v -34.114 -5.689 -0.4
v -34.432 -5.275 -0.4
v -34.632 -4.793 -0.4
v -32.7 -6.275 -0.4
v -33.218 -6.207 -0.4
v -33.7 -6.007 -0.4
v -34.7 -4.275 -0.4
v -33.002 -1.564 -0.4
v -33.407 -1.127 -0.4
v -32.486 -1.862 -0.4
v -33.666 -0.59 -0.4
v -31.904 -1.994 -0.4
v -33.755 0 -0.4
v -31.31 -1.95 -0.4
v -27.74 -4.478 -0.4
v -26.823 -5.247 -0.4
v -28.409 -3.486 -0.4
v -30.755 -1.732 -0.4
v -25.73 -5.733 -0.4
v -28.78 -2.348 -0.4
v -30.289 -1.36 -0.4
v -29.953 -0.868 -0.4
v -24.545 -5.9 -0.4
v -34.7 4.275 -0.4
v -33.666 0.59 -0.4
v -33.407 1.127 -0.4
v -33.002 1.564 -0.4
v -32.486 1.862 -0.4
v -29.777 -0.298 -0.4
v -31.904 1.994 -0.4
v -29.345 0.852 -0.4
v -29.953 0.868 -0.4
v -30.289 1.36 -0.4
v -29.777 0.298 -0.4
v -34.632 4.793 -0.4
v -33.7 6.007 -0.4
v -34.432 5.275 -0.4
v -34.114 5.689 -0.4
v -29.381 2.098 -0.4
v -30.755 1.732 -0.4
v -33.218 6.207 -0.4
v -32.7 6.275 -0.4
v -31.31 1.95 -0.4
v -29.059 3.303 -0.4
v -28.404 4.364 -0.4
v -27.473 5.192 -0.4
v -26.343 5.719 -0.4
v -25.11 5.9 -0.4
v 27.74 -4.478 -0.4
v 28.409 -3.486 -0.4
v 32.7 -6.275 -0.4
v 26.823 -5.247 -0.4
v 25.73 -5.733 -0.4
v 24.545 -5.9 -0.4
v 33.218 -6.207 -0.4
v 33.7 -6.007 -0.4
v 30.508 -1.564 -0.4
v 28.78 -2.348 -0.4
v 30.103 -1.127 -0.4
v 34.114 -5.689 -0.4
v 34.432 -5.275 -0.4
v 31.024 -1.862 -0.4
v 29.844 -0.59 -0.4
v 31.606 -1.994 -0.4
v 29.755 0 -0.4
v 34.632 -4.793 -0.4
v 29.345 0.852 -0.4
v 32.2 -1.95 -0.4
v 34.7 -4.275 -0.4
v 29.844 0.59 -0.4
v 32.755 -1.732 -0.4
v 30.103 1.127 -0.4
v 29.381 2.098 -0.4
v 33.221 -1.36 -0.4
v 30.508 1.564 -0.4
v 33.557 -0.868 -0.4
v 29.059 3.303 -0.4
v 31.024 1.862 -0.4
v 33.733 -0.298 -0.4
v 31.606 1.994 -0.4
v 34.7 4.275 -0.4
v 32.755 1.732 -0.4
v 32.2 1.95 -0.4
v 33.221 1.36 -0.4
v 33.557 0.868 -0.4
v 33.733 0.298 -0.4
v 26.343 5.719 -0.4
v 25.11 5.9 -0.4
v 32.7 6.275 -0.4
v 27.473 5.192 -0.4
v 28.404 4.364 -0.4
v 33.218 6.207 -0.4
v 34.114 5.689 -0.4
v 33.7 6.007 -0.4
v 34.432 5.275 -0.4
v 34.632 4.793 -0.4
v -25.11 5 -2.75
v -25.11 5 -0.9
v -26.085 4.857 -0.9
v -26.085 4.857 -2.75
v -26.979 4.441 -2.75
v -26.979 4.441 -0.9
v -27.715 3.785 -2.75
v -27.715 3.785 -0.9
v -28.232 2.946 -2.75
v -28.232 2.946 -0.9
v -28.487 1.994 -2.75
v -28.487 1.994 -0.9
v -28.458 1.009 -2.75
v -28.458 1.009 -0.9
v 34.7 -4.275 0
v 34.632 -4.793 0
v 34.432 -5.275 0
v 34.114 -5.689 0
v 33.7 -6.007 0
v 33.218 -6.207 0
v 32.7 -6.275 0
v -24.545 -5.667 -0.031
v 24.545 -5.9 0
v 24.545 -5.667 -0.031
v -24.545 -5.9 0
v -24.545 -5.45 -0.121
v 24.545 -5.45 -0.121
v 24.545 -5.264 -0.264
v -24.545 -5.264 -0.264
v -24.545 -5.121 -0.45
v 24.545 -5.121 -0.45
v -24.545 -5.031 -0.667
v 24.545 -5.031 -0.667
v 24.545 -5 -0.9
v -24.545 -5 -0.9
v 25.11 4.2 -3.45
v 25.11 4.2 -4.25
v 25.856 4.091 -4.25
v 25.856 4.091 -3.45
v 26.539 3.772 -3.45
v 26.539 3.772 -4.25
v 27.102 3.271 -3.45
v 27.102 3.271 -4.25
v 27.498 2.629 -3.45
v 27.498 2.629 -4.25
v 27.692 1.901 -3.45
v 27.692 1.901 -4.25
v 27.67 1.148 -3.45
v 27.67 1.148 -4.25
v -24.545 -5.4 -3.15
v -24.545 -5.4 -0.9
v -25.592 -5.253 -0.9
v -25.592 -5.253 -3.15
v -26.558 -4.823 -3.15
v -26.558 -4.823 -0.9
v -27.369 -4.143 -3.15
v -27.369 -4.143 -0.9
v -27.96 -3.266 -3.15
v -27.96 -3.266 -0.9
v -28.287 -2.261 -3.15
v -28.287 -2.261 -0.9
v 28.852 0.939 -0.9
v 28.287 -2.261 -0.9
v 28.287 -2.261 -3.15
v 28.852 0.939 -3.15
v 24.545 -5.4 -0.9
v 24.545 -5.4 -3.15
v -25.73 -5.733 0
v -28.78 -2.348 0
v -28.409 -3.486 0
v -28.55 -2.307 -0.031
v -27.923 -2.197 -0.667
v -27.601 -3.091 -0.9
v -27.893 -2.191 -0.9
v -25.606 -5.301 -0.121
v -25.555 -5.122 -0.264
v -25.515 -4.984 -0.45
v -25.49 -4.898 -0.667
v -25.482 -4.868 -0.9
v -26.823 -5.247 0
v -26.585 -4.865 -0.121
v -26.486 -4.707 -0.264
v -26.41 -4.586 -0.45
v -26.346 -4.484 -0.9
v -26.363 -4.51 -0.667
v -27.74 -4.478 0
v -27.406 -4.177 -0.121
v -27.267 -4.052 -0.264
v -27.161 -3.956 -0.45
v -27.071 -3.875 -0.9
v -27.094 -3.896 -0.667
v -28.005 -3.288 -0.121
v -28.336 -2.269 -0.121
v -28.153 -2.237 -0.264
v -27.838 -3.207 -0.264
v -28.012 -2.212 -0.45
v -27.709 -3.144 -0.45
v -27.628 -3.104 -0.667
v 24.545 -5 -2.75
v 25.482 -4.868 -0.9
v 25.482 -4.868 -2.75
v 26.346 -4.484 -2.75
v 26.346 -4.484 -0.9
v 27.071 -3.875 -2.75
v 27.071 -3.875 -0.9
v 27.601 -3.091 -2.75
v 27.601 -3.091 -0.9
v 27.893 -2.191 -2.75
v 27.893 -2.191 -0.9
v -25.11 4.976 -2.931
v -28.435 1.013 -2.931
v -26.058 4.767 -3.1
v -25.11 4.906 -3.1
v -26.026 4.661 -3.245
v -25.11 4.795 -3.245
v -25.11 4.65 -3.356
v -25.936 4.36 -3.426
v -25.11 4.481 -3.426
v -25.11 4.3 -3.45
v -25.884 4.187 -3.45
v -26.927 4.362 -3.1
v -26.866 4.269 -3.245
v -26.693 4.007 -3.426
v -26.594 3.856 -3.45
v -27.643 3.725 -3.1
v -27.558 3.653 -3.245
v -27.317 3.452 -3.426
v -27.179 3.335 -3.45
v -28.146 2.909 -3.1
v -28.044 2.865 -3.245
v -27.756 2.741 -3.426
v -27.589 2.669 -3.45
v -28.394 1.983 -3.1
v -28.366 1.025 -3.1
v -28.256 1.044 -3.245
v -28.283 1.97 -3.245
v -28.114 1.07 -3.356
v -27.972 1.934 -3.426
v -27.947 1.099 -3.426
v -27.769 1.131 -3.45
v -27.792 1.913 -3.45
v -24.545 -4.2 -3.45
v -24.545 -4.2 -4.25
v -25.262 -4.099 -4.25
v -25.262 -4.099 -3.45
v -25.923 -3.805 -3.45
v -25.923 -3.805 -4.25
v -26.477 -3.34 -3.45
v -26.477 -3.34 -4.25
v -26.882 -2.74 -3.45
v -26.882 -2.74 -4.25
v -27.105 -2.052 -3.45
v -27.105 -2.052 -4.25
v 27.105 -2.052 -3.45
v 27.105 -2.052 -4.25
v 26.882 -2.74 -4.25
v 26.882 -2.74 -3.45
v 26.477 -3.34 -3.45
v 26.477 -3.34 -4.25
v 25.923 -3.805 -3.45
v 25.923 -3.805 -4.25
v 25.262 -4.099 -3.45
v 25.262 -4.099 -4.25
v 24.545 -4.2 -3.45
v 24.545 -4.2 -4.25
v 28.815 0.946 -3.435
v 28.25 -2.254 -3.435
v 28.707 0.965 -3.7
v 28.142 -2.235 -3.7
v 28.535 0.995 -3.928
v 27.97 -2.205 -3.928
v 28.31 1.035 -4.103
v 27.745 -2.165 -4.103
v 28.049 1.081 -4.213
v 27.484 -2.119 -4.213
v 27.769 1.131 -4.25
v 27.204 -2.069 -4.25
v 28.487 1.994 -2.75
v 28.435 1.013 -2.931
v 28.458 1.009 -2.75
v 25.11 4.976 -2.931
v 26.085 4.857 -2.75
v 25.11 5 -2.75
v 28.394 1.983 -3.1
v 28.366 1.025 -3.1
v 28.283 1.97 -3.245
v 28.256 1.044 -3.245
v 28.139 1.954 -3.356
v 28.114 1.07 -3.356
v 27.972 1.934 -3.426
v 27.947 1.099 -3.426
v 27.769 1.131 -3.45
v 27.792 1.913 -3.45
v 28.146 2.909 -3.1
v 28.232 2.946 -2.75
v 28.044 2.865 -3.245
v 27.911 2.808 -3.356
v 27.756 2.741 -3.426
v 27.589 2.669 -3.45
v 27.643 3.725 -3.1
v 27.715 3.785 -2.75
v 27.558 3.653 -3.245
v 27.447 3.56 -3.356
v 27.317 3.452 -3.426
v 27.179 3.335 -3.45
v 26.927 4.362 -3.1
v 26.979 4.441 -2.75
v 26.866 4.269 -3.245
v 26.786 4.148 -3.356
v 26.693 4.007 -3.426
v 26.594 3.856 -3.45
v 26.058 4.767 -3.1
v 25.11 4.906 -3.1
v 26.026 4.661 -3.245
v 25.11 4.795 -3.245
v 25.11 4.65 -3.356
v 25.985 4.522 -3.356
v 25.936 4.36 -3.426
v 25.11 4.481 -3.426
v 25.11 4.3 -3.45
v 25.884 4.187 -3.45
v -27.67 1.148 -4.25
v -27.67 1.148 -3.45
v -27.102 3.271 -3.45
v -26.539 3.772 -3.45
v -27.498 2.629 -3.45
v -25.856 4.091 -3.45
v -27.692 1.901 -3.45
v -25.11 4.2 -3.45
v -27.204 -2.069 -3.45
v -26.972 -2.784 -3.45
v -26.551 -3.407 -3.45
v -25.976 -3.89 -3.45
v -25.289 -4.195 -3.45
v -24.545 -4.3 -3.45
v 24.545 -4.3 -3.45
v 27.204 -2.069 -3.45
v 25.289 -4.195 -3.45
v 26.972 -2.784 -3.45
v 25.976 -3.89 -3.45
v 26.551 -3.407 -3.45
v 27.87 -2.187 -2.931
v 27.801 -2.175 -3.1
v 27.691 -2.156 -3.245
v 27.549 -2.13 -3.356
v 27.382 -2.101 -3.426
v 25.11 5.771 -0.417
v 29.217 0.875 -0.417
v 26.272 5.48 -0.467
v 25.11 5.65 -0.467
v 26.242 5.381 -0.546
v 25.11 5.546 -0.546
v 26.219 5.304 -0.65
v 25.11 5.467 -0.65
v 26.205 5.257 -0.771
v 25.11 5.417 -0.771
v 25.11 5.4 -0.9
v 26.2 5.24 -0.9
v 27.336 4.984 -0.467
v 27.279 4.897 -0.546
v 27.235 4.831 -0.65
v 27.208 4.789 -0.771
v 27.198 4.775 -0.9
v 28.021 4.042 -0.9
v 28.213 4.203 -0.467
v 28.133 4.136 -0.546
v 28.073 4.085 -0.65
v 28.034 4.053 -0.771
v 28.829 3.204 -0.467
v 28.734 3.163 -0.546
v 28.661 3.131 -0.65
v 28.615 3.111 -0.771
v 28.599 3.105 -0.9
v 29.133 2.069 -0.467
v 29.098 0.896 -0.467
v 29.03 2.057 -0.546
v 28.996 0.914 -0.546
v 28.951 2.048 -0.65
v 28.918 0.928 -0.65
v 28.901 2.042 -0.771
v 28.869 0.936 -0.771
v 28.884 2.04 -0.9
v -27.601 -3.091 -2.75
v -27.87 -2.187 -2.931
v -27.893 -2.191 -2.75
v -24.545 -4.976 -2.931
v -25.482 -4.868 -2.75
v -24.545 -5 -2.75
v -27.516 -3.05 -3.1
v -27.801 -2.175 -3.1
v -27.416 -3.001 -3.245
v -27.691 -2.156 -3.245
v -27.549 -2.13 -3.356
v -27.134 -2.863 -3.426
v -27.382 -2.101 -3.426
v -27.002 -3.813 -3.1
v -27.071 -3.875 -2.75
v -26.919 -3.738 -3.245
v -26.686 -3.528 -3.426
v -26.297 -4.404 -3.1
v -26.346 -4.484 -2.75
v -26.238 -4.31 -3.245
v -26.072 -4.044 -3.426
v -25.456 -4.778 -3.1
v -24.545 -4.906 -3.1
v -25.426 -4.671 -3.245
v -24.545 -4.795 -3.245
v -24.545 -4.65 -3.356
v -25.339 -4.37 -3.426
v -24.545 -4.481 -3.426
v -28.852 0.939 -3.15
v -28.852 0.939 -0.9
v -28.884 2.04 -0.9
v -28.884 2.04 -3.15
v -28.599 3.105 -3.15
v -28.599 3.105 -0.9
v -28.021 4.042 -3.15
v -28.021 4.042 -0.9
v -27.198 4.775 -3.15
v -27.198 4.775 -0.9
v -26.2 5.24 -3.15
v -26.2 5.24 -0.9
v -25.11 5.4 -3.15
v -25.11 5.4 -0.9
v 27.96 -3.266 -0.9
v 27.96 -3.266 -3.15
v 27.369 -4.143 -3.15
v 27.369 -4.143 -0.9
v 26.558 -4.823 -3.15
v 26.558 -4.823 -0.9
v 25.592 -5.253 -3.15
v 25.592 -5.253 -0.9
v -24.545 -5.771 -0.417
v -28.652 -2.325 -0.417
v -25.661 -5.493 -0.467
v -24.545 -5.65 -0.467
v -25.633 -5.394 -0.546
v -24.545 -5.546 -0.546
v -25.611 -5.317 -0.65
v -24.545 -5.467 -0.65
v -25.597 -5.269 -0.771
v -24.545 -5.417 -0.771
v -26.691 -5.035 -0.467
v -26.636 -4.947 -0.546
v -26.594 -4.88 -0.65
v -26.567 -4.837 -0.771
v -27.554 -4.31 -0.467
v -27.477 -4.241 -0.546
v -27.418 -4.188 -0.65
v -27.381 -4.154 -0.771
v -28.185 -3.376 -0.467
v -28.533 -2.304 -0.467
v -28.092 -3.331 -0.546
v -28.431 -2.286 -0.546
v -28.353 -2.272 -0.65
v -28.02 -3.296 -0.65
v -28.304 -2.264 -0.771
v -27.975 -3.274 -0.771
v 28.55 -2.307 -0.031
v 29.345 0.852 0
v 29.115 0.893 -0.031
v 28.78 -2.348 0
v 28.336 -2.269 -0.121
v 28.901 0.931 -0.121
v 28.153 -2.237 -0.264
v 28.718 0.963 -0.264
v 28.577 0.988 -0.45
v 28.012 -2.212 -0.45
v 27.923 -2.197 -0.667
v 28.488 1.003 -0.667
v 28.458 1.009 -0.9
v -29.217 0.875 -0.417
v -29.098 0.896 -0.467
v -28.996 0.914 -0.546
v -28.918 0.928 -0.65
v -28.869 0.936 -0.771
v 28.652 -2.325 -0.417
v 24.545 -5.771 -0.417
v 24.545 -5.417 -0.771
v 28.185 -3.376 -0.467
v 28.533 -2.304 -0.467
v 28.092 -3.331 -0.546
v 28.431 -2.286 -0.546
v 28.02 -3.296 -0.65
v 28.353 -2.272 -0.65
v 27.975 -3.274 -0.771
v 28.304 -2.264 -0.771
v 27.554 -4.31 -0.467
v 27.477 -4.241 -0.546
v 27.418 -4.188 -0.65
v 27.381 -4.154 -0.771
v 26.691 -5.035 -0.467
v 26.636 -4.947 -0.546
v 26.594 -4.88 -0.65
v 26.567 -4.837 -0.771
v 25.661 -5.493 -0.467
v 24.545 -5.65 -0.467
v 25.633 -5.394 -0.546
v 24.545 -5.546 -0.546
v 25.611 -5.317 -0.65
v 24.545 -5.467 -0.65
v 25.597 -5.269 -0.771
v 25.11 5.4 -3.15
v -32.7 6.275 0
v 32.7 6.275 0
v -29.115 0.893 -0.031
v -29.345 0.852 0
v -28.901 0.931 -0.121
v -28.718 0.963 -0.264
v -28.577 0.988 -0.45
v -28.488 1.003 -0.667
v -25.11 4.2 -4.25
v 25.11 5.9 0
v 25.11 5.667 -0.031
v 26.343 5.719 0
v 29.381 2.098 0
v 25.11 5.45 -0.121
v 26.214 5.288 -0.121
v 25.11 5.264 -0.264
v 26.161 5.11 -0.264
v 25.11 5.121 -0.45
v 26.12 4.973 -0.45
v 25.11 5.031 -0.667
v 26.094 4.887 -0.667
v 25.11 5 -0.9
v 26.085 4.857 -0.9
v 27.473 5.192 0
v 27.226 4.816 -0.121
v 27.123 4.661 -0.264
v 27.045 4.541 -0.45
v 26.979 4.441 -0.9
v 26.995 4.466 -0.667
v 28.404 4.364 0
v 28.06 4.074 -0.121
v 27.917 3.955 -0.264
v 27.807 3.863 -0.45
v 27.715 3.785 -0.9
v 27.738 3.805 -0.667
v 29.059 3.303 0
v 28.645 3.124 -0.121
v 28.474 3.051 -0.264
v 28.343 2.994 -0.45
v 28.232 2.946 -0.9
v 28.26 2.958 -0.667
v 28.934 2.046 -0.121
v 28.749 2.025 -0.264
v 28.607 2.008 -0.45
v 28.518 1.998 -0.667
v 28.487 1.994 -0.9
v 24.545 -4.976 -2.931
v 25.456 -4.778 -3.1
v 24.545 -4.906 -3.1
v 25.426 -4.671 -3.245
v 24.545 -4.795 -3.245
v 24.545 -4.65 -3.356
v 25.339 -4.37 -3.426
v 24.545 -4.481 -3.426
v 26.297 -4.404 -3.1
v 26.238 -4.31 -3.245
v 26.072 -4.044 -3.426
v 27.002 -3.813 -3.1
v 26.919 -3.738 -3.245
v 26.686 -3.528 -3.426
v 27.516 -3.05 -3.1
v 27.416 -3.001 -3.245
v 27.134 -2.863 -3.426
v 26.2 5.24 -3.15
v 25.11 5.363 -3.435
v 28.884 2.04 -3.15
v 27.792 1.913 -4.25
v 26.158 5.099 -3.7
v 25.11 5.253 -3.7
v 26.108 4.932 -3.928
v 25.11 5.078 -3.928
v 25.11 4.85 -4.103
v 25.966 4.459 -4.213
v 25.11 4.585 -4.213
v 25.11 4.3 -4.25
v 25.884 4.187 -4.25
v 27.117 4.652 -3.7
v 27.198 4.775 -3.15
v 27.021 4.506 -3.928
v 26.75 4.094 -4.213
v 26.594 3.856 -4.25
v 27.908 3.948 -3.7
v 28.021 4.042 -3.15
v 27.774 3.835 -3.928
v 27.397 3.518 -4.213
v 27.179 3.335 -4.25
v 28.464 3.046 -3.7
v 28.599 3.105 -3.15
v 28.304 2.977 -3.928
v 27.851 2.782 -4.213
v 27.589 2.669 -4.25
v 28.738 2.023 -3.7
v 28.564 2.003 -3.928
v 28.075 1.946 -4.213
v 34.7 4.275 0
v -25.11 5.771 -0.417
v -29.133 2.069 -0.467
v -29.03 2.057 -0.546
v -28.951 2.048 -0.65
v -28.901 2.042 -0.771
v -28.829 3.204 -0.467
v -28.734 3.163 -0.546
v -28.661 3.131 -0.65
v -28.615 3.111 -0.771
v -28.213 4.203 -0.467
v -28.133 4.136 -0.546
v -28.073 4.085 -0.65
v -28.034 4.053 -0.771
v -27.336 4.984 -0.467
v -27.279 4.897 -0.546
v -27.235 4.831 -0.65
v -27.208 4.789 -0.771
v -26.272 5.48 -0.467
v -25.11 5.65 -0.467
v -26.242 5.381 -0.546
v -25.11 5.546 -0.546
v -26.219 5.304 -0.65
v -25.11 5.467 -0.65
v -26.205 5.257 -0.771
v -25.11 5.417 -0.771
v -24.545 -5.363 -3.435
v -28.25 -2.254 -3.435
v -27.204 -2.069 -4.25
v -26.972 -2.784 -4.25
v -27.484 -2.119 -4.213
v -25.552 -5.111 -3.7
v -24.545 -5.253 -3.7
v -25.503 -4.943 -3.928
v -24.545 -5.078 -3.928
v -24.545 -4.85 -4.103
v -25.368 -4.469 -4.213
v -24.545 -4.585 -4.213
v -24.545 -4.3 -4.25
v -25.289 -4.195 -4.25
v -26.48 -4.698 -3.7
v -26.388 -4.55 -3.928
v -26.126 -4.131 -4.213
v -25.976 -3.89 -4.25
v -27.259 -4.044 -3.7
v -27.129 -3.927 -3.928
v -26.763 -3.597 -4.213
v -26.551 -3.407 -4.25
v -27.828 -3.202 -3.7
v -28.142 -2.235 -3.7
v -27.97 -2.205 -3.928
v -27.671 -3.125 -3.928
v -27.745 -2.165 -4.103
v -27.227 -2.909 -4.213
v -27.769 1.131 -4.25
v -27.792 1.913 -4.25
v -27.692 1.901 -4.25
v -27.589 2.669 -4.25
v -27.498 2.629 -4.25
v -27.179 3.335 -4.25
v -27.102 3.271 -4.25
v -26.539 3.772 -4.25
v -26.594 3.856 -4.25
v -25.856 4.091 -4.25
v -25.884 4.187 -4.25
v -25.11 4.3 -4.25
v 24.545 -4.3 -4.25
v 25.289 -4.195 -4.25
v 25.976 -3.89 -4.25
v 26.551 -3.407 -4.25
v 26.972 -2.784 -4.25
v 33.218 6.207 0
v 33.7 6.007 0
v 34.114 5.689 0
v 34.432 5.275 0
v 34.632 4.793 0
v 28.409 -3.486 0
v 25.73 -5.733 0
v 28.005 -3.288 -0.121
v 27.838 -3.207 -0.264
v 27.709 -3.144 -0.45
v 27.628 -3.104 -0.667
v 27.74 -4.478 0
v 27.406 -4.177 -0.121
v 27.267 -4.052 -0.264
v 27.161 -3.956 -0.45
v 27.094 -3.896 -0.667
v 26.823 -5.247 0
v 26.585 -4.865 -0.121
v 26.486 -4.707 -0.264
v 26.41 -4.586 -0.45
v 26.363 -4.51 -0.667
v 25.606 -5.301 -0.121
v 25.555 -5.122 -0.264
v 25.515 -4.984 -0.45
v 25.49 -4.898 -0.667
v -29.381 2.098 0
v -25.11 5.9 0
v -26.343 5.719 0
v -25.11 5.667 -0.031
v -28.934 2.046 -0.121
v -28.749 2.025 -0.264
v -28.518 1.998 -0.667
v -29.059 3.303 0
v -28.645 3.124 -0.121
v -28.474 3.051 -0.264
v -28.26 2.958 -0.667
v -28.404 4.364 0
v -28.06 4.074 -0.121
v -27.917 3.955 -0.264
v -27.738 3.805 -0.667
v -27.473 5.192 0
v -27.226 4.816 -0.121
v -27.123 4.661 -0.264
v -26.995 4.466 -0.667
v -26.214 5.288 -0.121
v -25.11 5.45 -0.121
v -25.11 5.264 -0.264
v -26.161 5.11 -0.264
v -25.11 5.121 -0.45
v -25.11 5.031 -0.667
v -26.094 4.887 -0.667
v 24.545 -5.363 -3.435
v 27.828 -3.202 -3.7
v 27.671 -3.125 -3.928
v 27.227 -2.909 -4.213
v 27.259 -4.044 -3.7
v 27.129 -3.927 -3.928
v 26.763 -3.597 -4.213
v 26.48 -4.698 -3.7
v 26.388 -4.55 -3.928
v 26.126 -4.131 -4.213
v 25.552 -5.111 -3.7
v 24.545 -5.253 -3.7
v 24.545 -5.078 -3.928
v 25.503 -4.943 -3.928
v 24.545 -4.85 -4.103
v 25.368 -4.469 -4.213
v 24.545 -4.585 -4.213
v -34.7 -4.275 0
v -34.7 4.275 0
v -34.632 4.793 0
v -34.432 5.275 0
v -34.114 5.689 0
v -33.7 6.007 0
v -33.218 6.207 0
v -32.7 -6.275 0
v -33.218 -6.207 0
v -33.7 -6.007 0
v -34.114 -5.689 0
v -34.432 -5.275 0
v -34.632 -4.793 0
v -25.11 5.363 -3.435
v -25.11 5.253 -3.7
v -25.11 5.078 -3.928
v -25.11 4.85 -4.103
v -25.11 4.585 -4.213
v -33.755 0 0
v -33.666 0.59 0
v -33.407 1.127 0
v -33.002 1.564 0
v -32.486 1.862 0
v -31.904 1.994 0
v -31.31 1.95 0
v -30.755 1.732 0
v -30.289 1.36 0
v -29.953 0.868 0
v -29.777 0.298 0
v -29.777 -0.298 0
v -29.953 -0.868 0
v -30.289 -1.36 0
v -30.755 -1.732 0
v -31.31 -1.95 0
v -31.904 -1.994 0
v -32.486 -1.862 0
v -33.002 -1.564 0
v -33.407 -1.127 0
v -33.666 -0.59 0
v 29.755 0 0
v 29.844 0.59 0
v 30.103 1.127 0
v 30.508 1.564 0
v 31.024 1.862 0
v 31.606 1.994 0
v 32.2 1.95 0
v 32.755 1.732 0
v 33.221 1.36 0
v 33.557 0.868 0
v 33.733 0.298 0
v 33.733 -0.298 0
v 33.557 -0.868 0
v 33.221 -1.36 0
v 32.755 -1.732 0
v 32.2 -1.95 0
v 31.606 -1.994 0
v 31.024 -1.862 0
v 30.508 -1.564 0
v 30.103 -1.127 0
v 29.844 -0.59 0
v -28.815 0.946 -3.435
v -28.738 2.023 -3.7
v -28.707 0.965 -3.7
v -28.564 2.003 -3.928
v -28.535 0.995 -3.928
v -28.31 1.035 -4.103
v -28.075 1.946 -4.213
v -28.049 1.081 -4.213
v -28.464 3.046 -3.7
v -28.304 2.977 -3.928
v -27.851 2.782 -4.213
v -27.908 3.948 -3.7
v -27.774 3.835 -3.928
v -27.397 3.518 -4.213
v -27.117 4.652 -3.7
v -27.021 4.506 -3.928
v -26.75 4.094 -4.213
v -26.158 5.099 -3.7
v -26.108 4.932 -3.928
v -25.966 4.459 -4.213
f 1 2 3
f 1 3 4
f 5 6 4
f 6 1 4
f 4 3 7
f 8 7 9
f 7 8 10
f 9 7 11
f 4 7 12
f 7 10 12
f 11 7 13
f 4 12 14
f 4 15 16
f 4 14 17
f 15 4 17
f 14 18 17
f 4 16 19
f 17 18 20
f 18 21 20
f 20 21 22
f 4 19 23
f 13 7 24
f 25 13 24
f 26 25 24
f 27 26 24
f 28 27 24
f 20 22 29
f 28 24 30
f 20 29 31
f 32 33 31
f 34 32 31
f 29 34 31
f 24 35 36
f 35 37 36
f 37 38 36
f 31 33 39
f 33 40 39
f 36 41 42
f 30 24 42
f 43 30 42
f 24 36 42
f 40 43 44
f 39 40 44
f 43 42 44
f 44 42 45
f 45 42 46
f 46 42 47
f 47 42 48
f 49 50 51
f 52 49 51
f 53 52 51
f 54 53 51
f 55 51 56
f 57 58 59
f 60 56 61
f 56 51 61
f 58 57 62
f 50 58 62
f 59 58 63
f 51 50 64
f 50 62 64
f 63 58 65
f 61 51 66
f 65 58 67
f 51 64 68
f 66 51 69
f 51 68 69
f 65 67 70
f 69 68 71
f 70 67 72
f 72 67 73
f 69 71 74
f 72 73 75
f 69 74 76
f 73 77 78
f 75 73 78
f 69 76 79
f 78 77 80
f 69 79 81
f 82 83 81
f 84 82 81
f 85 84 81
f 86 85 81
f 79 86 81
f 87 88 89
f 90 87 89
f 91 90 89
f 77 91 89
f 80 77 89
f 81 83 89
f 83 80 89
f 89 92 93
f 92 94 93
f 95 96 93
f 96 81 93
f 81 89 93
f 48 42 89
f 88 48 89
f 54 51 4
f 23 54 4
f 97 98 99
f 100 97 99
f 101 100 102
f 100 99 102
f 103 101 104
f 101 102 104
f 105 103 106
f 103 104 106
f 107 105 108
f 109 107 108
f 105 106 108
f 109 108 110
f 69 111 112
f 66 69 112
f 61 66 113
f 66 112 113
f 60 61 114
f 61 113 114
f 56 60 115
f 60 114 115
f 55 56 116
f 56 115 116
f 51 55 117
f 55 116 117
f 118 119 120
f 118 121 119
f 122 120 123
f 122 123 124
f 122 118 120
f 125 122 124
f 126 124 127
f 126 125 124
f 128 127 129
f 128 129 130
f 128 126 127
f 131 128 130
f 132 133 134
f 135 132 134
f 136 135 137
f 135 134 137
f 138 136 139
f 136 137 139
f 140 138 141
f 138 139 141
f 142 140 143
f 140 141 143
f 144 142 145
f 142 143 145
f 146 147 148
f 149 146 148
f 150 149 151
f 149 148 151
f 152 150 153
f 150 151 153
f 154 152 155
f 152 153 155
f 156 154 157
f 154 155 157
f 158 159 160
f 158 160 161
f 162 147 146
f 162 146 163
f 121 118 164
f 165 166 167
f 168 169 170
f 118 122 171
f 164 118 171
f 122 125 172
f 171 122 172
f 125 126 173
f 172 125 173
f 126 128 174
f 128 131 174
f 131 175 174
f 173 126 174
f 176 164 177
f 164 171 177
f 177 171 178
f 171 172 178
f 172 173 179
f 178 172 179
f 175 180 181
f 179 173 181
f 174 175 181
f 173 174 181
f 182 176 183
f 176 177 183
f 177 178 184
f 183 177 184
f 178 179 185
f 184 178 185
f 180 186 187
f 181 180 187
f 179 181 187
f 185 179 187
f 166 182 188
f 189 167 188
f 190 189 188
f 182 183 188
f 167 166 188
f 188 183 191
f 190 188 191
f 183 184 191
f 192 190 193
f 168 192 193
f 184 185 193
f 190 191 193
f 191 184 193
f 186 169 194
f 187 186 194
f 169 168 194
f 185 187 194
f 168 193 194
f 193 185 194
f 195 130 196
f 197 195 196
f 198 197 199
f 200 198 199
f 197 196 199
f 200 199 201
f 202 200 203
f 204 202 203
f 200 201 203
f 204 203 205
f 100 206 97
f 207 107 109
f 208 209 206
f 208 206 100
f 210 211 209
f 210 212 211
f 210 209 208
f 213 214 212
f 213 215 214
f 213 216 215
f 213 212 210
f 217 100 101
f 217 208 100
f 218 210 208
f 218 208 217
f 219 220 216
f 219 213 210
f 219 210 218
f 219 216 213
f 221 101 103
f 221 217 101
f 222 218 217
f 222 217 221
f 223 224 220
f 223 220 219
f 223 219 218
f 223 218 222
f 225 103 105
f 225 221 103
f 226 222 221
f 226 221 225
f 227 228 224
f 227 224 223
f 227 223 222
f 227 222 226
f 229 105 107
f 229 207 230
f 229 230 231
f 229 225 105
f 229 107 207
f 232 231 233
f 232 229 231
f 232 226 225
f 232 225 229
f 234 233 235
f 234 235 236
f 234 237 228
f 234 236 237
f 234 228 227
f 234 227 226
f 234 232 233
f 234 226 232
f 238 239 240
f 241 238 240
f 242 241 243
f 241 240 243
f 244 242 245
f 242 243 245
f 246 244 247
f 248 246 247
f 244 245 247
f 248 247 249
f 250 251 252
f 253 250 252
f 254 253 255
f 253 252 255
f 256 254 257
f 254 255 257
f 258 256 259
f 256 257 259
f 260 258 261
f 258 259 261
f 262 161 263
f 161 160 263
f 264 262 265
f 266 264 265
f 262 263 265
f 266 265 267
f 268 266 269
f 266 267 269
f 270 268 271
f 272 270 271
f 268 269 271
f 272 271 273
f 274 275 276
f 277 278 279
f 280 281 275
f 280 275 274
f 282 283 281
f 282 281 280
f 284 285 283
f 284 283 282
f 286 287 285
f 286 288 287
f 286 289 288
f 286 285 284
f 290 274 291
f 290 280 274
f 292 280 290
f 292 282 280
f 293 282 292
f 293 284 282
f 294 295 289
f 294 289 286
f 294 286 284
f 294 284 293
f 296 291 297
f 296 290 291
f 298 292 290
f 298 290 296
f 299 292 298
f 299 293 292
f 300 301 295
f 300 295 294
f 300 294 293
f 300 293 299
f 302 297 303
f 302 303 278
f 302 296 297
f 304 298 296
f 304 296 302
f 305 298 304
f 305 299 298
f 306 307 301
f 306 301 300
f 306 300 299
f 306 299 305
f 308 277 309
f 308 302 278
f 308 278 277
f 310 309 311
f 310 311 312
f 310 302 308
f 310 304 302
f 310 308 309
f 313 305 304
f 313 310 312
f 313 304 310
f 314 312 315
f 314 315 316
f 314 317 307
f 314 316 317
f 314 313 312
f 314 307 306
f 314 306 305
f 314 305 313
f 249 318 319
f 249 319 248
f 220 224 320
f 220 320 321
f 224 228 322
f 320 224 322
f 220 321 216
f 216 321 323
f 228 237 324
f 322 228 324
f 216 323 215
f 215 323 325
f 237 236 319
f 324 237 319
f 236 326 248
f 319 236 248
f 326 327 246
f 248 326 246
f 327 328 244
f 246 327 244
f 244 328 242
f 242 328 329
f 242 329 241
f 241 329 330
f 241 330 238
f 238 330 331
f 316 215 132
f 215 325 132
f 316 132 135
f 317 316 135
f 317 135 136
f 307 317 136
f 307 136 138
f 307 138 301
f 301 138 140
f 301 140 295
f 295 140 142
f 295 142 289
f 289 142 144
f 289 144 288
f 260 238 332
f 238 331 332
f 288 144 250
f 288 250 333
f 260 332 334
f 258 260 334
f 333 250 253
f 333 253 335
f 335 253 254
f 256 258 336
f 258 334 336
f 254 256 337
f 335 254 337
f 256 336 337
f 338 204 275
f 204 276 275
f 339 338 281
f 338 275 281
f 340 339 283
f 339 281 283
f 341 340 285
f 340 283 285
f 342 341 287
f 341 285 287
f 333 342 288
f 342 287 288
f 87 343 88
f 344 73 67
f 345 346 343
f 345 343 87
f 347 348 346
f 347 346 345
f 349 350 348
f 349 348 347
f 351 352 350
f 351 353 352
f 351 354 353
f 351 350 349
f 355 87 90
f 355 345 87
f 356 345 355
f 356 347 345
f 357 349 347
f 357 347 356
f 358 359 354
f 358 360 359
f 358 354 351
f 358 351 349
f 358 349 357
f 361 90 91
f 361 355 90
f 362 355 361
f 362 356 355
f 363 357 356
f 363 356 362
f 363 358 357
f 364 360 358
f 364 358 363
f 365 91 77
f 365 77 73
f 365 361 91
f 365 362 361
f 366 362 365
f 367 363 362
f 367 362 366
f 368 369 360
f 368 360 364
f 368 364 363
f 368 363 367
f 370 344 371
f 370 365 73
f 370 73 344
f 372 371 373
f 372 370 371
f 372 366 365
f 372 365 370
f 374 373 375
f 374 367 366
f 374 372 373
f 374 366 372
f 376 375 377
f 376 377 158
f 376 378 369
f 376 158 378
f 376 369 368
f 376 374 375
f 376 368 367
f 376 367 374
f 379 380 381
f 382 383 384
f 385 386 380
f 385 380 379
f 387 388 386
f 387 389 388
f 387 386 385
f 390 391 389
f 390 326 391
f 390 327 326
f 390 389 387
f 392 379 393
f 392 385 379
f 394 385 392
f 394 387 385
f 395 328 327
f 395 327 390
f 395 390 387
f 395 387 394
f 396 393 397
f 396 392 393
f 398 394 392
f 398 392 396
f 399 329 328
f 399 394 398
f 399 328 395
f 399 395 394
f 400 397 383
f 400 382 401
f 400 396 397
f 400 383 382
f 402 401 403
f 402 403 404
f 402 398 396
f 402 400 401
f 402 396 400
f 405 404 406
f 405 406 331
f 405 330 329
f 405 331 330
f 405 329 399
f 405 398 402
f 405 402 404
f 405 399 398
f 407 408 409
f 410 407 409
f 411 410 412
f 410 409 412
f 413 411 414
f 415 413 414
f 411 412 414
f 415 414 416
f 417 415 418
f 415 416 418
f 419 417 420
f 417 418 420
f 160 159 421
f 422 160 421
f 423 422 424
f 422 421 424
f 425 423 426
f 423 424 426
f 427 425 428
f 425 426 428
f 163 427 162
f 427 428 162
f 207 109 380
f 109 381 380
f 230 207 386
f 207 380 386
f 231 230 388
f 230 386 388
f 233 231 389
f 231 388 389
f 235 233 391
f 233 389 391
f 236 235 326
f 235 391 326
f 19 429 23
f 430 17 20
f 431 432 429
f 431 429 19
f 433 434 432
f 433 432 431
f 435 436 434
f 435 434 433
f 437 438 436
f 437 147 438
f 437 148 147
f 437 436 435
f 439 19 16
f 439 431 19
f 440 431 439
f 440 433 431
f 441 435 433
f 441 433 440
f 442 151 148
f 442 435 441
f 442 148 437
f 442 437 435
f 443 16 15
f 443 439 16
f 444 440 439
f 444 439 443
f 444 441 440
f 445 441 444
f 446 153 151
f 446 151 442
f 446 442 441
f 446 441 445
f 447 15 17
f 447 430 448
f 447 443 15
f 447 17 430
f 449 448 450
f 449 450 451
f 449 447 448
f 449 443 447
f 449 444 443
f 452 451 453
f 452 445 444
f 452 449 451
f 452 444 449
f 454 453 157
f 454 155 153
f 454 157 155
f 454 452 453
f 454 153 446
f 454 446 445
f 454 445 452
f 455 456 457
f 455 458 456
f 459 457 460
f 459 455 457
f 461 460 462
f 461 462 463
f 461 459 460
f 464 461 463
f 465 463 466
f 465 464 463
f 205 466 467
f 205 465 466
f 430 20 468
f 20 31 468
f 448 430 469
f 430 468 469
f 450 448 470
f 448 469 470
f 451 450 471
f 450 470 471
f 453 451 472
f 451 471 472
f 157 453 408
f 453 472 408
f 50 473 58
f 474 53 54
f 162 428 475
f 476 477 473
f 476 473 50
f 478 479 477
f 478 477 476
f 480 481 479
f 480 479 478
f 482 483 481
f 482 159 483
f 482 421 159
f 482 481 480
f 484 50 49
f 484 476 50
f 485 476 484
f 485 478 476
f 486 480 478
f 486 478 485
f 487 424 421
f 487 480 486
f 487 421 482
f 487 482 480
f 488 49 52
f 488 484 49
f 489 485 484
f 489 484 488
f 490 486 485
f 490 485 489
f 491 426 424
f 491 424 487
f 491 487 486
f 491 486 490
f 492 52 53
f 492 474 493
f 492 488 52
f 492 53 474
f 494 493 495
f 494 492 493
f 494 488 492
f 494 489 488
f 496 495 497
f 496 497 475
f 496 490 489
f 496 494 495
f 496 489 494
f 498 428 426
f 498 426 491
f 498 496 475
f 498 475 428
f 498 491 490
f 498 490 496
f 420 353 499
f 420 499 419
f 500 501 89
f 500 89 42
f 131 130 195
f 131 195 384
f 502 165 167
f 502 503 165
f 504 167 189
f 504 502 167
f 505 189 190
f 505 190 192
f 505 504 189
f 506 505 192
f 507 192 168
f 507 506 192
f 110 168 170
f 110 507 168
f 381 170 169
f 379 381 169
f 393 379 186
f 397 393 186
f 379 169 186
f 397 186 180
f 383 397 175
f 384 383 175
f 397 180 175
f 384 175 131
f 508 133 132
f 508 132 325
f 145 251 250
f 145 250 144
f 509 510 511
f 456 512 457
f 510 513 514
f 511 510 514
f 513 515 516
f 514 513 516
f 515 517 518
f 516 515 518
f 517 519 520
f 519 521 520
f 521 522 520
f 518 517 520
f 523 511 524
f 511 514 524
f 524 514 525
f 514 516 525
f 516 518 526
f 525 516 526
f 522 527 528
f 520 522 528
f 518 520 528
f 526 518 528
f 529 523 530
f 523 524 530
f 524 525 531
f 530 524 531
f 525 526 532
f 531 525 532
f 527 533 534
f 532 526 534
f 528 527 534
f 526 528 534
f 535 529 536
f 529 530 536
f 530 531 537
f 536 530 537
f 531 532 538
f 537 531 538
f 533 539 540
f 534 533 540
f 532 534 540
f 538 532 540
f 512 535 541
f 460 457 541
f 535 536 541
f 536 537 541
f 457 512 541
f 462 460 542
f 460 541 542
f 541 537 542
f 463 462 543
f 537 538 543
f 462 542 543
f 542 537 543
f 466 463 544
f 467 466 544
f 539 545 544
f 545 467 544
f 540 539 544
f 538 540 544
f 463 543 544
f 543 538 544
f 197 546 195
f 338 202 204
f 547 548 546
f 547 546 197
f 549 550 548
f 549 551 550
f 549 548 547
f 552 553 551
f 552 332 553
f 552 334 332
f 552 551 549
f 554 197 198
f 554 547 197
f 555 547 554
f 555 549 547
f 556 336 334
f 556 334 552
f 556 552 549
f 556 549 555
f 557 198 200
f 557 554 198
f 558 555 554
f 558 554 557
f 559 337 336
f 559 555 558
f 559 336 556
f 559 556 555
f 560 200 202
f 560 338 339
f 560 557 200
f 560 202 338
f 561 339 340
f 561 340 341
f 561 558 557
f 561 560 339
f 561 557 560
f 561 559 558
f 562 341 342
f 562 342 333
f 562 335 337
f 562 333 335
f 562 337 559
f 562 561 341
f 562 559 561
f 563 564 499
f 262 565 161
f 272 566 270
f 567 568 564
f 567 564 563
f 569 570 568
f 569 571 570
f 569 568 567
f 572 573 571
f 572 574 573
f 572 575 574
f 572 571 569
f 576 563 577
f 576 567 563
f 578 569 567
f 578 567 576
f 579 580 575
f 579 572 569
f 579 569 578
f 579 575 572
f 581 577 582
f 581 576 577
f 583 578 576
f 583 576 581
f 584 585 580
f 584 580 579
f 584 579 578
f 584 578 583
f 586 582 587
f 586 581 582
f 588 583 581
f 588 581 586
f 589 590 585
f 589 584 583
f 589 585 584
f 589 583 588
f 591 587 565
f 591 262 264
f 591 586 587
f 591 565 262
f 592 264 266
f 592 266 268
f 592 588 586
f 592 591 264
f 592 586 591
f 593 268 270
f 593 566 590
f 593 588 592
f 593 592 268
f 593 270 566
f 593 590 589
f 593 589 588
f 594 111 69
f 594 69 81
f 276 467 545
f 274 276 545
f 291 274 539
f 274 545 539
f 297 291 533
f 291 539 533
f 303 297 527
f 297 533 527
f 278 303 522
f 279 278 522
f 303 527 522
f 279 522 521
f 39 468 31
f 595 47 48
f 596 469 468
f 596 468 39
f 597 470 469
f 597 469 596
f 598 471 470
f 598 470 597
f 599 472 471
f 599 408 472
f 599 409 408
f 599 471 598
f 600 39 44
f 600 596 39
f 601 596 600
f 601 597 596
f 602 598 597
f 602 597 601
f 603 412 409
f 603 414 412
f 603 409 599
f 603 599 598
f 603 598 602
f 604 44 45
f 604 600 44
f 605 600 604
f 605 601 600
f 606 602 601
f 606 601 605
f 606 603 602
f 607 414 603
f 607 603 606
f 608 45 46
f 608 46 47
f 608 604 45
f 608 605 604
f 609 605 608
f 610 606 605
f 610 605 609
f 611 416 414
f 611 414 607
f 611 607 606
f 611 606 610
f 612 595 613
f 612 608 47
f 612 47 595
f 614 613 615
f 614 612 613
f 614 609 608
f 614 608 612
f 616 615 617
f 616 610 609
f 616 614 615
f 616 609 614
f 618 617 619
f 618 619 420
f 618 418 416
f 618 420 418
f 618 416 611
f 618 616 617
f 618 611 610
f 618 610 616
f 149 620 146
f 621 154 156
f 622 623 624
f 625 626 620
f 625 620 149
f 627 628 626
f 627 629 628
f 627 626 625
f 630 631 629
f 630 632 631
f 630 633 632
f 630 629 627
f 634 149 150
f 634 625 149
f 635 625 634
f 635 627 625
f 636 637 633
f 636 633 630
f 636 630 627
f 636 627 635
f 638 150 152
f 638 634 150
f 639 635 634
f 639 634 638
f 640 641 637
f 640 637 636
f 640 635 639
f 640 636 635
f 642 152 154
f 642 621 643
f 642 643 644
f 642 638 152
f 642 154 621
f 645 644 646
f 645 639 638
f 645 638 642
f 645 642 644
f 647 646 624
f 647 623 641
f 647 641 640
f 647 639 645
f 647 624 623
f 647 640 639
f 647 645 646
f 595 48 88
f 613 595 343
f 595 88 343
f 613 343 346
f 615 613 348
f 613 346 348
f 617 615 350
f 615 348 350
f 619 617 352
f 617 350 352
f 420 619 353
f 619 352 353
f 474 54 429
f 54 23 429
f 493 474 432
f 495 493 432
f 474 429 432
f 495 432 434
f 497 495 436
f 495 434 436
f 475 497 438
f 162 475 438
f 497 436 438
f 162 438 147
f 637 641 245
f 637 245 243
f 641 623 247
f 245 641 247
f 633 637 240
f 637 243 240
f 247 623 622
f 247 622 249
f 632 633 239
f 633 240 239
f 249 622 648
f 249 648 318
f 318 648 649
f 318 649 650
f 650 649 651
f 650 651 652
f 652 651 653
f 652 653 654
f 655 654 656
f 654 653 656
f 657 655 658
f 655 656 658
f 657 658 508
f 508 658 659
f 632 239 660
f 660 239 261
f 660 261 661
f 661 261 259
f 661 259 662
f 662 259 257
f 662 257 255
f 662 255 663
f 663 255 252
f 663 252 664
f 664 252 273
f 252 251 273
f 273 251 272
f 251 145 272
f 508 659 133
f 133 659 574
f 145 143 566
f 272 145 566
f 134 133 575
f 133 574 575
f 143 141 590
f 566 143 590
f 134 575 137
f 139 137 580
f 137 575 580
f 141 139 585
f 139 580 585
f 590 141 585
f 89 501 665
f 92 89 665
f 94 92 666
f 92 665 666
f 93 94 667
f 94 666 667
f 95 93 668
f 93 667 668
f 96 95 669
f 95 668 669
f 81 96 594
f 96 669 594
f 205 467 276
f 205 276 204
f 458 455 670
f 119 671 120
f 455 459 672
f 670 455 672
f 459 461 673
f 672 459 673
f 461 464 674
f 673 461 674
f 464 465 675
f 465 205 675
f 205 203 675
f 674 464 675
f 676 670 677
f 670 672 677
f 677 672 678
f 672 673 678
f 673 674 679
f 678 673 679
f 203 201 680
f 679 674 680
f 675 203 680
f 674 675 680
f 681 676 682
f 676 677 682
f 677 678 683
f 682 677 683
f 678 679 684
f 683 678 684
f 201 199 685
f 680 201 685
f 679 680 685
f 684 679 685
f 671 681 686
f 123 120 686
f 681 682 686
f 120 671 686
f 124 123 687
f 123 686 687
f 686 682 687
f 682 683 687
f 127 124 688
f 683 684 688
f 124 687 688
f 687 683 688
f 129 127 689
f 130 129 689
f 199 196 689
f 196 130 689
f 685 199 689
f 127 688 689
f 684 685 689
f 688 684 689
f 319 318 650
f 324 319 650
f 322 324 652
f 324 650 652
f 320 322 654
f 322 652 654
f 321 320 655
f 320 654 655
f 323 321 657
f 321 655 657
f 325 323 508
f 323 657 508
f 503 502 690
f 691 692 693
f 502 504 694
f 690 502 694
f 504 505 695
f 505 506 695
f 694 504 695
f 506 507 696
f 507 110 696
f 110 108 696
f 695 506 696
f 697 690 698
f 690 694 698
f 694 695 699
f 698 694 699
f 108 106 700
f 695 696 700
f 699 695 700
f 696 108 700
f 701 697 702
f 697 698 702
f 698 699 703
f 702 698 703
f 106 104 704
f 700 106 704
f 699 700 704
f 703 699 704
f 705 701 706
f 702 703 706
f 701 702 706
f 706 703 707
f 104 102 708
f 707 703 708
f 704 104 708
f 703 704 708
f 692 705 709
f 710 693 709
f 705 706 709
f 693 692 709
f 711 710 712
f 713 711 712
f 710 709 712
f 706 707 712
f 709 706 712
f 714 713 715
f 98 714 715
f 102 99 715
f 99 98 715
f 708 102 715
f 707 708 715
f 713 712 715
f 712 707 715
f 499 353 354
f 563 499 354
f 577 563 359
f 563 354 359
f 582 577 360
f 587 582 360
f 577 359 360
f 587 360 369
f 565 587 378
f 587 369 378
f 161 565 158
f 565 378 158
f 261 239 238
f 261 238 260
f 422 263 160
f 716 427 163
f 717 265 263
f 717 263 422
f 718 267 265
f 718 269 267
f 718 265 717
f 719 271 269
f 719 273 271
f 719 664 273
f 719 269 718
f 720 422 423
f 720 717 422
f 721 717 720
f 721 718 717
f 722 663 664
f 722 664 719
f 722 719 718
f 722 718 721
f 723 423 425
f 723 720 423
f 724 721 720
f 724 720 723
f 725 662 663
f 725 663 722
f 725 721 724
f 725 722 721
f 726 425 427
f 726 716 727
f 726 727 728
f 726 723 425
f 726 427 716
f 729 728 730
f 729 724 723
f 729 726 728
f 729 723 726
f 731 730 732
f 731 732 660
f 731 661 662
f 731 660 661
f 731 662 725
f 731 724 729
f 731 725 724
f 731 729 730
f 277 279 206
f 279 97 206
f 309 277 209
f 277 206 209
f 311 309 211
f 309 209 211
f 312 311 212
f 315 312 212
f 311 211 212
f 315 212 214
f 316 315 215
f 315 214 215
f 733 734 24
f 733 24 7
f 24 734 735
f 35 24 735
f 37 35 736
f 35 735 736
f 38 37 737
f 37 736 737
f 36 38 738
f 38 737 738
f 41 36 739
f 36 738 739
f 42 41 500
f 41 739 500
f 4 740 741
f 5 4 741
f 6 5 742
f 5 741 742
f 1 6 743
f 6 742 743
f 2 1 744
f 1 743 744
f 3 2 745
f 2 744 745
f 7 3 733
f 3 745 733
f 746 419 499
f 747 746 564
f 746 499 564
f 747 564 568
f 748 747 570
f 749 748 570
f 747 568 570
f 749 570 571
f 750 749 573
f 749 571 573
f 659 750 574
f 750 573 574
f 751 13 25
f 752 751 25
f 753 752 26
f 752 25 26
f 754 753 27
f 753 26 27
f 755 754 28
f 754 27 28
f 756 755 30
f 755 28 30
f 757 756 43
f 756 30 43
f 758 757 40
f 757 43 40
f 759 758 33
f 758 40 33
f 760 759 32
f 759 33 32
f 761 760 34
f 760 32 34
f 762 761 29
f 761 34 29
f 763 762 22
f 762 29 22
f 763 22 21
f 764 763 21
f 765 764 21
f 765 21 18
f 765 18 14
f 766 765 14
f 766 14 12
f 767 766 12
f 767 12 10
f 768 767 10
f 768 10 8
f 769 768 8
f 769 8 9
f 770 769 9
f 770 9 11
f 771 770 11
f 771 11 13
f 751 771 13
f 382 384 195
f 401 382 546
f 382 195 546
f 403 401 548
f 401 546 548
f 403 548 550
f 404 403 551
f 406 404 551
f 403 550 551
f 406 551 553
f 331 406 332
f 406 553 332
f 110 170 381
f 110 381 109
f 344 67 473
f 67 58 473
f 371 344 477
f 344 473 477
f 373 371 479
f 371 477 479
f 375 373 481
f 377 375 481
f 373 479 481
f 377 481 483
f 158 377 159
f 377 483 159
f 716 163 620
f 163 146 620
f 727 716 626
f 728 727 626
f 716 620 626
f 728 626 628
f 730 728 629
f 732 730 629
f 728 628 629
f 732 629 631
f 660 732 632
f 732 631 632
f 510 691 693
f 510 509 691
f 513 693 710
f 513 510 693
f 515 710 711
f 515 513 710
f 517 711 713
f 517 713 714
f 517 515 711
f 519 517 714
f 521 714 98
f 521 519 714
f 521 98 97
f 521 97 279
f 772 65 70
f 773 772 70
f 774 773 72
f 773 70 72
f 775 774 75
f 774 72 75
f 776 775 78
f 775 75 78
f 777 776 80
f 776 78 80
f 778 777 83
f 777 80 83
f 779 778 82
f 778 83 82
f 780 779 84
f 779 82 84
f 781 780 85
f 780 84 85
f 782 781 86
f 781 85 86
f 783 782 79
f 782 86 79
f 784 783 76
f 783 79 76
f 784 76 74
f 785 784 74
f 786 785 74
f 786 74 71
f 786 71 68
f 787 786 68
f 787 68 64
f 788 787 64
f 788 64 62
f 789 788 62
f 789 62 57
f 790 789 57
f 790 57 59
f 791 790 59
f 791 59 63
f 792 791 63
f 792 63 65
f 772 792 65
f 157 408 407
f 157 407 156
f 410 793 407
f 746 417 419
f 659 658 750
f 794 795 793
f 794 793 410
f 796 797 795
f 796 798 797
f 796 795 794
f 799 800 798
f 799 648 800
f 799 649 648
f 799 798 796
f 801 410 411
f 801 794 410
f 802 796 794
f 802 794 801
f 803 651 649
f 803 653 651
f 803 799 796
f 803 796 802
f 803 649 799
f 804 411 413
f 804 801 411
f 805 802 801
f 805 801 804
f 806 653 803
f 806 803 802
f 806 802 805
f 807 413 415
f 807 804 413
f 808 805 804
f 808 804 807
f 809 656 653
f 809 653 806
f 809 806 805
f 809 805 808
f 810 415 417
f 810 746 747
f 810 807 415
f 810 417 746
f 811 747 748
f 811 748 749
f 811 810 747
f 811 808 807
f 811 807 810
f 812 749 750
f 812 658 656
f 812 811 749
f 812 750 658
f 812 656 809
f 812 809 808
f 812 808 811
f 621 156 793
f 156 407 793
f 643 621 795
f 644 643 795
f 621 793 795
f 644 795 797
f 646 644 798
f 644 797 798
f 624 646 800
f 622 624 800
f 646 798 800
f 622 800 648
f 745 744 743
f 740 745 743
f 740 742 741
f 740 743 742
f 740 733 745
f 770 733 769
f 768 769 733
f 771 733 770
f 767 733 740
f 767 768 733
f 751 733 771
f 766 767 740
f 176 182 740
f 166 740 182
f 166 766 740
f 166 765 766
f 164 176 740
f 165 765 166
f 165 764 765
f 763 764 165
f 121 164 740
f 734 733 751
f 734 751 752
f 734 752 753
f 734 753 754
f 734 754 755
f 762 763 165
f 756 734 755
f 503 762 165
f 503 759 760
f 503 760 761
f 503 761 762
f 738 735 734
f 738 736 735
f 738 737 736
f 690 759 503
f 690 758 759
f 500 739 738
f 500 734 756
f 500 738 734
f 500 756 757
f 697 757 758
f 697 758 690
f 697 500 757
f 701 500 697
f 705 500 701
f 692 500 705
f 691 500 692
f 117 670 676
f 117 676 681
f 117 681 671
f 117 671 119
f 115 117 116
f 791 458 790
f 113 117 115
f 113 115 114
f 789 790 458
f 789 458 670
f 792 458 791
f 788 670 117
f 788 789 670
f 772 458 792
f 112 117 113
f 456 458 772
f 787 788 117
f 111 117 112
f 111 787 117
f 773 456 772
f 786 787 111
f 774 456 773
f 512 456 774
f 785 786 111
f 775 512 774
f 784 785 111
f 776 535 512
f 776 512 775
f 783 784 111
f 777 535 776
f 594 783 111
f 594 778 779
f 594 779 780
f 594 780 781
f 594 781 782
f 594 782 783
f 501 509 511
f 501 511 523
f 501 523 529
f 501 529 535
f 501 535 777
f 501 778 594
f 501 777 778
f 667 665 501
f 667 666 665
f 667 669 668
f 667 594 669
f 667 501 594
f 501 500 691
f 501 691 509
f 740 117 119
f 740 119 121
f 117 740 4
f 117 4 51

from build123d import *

# Parameters (mm, degrees)
PAD002_DEPTH            = 0.4
SKETCH005_R             = 2
POCKET002_DEPTH         = 5
PAD003_DEPTH            = 3.85
POCKET003_DEPTH         = 4.251
POCKET004_DEPTH         = 3.45
FILLET003_R             = 0.7
FILLET004_R             = 0.5
FILLET005_R             = 1.1
FILLET006_R             = 0.9
BODY001_PLACEMENT_ANGLE = 180


with BuildPart() as part:
    # Sketch004 → Pad002 (new body)
    with BuildSketch(Plane.XY):
        with BuildLine():
            Line((-32.7, 6.275), (32.7, 6.275))
            ThreePointArc((34.7, 4.275), (34.114214, 5.689214), (32.7, 6.275))
            Line((34.7, 4.275), (34.7, -4.275))
            ThreePointArc((32.7, -6.275), (34.114214, -5.689214), (34.7, -4.275))
            Line((32.7, -6.275), (-32.7, -6.275))
            ThreePointArc((-34.7, -4.275), (-34.114214, -5.689214), (-32.7, -6.275))
            Line((-34.7, -4.275), (-34.7, 4.275))
            ThreePointArc((-32.7, 6.275), (-34.114214, 5.689214), (-34.7, 4.275))
        make_face()
    extrude(amount=PAD002_DEPTH)

    # Sketch005 (on Face10 of Pad002) → Pocket002 (cut)
    with BuildSketch(Plane.XY.offset(0.4)):
        with Locations((-31.755, 0)):
            Circle(SKETCH005_R)
        with Locations((31.755, 0)):
            Circle(SKETCH005_R)
    extrude(amount=-POCKET002_DEPTH, mode=Mode.SUBTRACT)

    # Sketch006 (on Face5 of Pocket002) → Pad003 (join)
    with BuildSketch(Plane.XY.offset(0.4)):
        with BuildLine():
            Line((-25.11, 5.4), (25.11, 5.4))
            ThreePointArc((28.852119, 0.939282), (28.021248, 4.04226), (25.11, 5.4))
            Line((28.852119, 0.939282), (28.287119, -2.260718))
            ThreePointArc((24.545, -5.4), (26.98726, -4.511248), (28.287119, -2.260718))
            Line((24.545, -5.4), (-24.545, -5.4))
            ThreePointArc((-28.287119, -2.260718), (-26.98726, -4.511248), (-24.545, -5.4))
            Line((-28.287119, -2.260718), (-28.852119, 0.939282))
            ThreePointArc((-25.11, 5.4), (-28.021248, 4.04226), (-28.852119, 0.939282))
        make_face()
    extrude(amount=PAD003_DEPTH)

    # Sketch007 (on Face21 of Pad003) → Pocket003 (cut, through all)
    with BuildSketch(Plane.XY.offset(4.25)):
        with BuildLine():
            Line((-25.11, 4.2), (25.11, 4.2))
            ThreePointArc((27.670397, 1.14793), (27.101906, 3.27102), (25.11, 4.2))
            Line((27.670397, 1.14793), (27.105397, -2.05207))
            ThreePointArc((24.545, -4.2), (26.21602, -3.591906), (27.105397, -2.05207))
            Line((24.545, -4.2), (-24.545, -4.2))
            ThreePointArc((-27.105397, -2.05207), (-26.21602, -3.591906), (-24.545, -4.2))
            Line((-27.105397, -2.05207), (-27.670397, 1.14793))
            ThreePointArc((-25.11, 4.2), (-27.101906, 3.27102), (-27.670397, 1.14793))
        make_face()
    extrude(amount=-POCKET003_DEPTH, mode=Mode.SUBTRACT)

    # Sketch008 (on Face4 of Pocket003) → Pocket004 (cut)
    with BuildSketch(Plane(origin=(0, 0, 0), x_dir=(1, 0, 0), z_dir=(0, 0, -1))):
        with BuildLine():
            Line((-24.545, 5), (24.545, 5))
            ThreePointArc((27.893211, 2.191169), (26.73018, 4.204801), (24.545, 5))
            Line((27.893211, 2.191169), (28.458211, -1.008831))
            ThreePointArc((25.11, -5), (27.714801, -3.78518), (28.458211, -1.008831))
            Line((25.11, -5), (-25.11, -5))
            ThreePointArc((-28.458211, -1.008831), (-27.714801, -3.78518), (-25.11, -5))
            Line((-28.458211, -1.008831), (-27.893211, 2.191169))
            ThreePointArc((-24.545, 5), (-26.73018, 4.204801), (-27.893211, 2.191169))
        make_face()
    extrude(amount=-POCKET004_DEPTH, mode=Mode.SUBTRACT)

    # Fillet003
    fillet003_edges = [part.edges().sort_by_distance(p)[0] for p in [
        (27.714801, 3.78518, 3.45),
    ]]
    fillet(fillet003_edges, radius=FILLET003_R)

    # Fillet004
    fillet004_edges = [part.edges().sort_by_distance(p)[0] for p in [
        (28.021248, 4.04226, 0.4),
    ]]
    fillet(fillet004_edges, radius=FILLET004_R)

    # Fillet005
    fillet005_edges = [part.edges().sort_by_distance(p)[0] for p in [
        (28.021248, 4.04226, 4.25),
    ]]
    fillet(fillet005_edges, radius=FILLET005_R)

    # Fillet006
    fillet006_edges = [part.edges().sort_by_distance(p)[0] for p in [
        (0, 5, 0),
    ]]
    fillet(fillet006_edges, radius=FILLET006_R)


with BuildPart() as part_1:
    # Body001 placement: moved
    add(part.part.rotate(Axis((0, 0, 0), (0, 1, 0)), BODY001_PLACEMENT_ANGLE))


solid = part_1.part
